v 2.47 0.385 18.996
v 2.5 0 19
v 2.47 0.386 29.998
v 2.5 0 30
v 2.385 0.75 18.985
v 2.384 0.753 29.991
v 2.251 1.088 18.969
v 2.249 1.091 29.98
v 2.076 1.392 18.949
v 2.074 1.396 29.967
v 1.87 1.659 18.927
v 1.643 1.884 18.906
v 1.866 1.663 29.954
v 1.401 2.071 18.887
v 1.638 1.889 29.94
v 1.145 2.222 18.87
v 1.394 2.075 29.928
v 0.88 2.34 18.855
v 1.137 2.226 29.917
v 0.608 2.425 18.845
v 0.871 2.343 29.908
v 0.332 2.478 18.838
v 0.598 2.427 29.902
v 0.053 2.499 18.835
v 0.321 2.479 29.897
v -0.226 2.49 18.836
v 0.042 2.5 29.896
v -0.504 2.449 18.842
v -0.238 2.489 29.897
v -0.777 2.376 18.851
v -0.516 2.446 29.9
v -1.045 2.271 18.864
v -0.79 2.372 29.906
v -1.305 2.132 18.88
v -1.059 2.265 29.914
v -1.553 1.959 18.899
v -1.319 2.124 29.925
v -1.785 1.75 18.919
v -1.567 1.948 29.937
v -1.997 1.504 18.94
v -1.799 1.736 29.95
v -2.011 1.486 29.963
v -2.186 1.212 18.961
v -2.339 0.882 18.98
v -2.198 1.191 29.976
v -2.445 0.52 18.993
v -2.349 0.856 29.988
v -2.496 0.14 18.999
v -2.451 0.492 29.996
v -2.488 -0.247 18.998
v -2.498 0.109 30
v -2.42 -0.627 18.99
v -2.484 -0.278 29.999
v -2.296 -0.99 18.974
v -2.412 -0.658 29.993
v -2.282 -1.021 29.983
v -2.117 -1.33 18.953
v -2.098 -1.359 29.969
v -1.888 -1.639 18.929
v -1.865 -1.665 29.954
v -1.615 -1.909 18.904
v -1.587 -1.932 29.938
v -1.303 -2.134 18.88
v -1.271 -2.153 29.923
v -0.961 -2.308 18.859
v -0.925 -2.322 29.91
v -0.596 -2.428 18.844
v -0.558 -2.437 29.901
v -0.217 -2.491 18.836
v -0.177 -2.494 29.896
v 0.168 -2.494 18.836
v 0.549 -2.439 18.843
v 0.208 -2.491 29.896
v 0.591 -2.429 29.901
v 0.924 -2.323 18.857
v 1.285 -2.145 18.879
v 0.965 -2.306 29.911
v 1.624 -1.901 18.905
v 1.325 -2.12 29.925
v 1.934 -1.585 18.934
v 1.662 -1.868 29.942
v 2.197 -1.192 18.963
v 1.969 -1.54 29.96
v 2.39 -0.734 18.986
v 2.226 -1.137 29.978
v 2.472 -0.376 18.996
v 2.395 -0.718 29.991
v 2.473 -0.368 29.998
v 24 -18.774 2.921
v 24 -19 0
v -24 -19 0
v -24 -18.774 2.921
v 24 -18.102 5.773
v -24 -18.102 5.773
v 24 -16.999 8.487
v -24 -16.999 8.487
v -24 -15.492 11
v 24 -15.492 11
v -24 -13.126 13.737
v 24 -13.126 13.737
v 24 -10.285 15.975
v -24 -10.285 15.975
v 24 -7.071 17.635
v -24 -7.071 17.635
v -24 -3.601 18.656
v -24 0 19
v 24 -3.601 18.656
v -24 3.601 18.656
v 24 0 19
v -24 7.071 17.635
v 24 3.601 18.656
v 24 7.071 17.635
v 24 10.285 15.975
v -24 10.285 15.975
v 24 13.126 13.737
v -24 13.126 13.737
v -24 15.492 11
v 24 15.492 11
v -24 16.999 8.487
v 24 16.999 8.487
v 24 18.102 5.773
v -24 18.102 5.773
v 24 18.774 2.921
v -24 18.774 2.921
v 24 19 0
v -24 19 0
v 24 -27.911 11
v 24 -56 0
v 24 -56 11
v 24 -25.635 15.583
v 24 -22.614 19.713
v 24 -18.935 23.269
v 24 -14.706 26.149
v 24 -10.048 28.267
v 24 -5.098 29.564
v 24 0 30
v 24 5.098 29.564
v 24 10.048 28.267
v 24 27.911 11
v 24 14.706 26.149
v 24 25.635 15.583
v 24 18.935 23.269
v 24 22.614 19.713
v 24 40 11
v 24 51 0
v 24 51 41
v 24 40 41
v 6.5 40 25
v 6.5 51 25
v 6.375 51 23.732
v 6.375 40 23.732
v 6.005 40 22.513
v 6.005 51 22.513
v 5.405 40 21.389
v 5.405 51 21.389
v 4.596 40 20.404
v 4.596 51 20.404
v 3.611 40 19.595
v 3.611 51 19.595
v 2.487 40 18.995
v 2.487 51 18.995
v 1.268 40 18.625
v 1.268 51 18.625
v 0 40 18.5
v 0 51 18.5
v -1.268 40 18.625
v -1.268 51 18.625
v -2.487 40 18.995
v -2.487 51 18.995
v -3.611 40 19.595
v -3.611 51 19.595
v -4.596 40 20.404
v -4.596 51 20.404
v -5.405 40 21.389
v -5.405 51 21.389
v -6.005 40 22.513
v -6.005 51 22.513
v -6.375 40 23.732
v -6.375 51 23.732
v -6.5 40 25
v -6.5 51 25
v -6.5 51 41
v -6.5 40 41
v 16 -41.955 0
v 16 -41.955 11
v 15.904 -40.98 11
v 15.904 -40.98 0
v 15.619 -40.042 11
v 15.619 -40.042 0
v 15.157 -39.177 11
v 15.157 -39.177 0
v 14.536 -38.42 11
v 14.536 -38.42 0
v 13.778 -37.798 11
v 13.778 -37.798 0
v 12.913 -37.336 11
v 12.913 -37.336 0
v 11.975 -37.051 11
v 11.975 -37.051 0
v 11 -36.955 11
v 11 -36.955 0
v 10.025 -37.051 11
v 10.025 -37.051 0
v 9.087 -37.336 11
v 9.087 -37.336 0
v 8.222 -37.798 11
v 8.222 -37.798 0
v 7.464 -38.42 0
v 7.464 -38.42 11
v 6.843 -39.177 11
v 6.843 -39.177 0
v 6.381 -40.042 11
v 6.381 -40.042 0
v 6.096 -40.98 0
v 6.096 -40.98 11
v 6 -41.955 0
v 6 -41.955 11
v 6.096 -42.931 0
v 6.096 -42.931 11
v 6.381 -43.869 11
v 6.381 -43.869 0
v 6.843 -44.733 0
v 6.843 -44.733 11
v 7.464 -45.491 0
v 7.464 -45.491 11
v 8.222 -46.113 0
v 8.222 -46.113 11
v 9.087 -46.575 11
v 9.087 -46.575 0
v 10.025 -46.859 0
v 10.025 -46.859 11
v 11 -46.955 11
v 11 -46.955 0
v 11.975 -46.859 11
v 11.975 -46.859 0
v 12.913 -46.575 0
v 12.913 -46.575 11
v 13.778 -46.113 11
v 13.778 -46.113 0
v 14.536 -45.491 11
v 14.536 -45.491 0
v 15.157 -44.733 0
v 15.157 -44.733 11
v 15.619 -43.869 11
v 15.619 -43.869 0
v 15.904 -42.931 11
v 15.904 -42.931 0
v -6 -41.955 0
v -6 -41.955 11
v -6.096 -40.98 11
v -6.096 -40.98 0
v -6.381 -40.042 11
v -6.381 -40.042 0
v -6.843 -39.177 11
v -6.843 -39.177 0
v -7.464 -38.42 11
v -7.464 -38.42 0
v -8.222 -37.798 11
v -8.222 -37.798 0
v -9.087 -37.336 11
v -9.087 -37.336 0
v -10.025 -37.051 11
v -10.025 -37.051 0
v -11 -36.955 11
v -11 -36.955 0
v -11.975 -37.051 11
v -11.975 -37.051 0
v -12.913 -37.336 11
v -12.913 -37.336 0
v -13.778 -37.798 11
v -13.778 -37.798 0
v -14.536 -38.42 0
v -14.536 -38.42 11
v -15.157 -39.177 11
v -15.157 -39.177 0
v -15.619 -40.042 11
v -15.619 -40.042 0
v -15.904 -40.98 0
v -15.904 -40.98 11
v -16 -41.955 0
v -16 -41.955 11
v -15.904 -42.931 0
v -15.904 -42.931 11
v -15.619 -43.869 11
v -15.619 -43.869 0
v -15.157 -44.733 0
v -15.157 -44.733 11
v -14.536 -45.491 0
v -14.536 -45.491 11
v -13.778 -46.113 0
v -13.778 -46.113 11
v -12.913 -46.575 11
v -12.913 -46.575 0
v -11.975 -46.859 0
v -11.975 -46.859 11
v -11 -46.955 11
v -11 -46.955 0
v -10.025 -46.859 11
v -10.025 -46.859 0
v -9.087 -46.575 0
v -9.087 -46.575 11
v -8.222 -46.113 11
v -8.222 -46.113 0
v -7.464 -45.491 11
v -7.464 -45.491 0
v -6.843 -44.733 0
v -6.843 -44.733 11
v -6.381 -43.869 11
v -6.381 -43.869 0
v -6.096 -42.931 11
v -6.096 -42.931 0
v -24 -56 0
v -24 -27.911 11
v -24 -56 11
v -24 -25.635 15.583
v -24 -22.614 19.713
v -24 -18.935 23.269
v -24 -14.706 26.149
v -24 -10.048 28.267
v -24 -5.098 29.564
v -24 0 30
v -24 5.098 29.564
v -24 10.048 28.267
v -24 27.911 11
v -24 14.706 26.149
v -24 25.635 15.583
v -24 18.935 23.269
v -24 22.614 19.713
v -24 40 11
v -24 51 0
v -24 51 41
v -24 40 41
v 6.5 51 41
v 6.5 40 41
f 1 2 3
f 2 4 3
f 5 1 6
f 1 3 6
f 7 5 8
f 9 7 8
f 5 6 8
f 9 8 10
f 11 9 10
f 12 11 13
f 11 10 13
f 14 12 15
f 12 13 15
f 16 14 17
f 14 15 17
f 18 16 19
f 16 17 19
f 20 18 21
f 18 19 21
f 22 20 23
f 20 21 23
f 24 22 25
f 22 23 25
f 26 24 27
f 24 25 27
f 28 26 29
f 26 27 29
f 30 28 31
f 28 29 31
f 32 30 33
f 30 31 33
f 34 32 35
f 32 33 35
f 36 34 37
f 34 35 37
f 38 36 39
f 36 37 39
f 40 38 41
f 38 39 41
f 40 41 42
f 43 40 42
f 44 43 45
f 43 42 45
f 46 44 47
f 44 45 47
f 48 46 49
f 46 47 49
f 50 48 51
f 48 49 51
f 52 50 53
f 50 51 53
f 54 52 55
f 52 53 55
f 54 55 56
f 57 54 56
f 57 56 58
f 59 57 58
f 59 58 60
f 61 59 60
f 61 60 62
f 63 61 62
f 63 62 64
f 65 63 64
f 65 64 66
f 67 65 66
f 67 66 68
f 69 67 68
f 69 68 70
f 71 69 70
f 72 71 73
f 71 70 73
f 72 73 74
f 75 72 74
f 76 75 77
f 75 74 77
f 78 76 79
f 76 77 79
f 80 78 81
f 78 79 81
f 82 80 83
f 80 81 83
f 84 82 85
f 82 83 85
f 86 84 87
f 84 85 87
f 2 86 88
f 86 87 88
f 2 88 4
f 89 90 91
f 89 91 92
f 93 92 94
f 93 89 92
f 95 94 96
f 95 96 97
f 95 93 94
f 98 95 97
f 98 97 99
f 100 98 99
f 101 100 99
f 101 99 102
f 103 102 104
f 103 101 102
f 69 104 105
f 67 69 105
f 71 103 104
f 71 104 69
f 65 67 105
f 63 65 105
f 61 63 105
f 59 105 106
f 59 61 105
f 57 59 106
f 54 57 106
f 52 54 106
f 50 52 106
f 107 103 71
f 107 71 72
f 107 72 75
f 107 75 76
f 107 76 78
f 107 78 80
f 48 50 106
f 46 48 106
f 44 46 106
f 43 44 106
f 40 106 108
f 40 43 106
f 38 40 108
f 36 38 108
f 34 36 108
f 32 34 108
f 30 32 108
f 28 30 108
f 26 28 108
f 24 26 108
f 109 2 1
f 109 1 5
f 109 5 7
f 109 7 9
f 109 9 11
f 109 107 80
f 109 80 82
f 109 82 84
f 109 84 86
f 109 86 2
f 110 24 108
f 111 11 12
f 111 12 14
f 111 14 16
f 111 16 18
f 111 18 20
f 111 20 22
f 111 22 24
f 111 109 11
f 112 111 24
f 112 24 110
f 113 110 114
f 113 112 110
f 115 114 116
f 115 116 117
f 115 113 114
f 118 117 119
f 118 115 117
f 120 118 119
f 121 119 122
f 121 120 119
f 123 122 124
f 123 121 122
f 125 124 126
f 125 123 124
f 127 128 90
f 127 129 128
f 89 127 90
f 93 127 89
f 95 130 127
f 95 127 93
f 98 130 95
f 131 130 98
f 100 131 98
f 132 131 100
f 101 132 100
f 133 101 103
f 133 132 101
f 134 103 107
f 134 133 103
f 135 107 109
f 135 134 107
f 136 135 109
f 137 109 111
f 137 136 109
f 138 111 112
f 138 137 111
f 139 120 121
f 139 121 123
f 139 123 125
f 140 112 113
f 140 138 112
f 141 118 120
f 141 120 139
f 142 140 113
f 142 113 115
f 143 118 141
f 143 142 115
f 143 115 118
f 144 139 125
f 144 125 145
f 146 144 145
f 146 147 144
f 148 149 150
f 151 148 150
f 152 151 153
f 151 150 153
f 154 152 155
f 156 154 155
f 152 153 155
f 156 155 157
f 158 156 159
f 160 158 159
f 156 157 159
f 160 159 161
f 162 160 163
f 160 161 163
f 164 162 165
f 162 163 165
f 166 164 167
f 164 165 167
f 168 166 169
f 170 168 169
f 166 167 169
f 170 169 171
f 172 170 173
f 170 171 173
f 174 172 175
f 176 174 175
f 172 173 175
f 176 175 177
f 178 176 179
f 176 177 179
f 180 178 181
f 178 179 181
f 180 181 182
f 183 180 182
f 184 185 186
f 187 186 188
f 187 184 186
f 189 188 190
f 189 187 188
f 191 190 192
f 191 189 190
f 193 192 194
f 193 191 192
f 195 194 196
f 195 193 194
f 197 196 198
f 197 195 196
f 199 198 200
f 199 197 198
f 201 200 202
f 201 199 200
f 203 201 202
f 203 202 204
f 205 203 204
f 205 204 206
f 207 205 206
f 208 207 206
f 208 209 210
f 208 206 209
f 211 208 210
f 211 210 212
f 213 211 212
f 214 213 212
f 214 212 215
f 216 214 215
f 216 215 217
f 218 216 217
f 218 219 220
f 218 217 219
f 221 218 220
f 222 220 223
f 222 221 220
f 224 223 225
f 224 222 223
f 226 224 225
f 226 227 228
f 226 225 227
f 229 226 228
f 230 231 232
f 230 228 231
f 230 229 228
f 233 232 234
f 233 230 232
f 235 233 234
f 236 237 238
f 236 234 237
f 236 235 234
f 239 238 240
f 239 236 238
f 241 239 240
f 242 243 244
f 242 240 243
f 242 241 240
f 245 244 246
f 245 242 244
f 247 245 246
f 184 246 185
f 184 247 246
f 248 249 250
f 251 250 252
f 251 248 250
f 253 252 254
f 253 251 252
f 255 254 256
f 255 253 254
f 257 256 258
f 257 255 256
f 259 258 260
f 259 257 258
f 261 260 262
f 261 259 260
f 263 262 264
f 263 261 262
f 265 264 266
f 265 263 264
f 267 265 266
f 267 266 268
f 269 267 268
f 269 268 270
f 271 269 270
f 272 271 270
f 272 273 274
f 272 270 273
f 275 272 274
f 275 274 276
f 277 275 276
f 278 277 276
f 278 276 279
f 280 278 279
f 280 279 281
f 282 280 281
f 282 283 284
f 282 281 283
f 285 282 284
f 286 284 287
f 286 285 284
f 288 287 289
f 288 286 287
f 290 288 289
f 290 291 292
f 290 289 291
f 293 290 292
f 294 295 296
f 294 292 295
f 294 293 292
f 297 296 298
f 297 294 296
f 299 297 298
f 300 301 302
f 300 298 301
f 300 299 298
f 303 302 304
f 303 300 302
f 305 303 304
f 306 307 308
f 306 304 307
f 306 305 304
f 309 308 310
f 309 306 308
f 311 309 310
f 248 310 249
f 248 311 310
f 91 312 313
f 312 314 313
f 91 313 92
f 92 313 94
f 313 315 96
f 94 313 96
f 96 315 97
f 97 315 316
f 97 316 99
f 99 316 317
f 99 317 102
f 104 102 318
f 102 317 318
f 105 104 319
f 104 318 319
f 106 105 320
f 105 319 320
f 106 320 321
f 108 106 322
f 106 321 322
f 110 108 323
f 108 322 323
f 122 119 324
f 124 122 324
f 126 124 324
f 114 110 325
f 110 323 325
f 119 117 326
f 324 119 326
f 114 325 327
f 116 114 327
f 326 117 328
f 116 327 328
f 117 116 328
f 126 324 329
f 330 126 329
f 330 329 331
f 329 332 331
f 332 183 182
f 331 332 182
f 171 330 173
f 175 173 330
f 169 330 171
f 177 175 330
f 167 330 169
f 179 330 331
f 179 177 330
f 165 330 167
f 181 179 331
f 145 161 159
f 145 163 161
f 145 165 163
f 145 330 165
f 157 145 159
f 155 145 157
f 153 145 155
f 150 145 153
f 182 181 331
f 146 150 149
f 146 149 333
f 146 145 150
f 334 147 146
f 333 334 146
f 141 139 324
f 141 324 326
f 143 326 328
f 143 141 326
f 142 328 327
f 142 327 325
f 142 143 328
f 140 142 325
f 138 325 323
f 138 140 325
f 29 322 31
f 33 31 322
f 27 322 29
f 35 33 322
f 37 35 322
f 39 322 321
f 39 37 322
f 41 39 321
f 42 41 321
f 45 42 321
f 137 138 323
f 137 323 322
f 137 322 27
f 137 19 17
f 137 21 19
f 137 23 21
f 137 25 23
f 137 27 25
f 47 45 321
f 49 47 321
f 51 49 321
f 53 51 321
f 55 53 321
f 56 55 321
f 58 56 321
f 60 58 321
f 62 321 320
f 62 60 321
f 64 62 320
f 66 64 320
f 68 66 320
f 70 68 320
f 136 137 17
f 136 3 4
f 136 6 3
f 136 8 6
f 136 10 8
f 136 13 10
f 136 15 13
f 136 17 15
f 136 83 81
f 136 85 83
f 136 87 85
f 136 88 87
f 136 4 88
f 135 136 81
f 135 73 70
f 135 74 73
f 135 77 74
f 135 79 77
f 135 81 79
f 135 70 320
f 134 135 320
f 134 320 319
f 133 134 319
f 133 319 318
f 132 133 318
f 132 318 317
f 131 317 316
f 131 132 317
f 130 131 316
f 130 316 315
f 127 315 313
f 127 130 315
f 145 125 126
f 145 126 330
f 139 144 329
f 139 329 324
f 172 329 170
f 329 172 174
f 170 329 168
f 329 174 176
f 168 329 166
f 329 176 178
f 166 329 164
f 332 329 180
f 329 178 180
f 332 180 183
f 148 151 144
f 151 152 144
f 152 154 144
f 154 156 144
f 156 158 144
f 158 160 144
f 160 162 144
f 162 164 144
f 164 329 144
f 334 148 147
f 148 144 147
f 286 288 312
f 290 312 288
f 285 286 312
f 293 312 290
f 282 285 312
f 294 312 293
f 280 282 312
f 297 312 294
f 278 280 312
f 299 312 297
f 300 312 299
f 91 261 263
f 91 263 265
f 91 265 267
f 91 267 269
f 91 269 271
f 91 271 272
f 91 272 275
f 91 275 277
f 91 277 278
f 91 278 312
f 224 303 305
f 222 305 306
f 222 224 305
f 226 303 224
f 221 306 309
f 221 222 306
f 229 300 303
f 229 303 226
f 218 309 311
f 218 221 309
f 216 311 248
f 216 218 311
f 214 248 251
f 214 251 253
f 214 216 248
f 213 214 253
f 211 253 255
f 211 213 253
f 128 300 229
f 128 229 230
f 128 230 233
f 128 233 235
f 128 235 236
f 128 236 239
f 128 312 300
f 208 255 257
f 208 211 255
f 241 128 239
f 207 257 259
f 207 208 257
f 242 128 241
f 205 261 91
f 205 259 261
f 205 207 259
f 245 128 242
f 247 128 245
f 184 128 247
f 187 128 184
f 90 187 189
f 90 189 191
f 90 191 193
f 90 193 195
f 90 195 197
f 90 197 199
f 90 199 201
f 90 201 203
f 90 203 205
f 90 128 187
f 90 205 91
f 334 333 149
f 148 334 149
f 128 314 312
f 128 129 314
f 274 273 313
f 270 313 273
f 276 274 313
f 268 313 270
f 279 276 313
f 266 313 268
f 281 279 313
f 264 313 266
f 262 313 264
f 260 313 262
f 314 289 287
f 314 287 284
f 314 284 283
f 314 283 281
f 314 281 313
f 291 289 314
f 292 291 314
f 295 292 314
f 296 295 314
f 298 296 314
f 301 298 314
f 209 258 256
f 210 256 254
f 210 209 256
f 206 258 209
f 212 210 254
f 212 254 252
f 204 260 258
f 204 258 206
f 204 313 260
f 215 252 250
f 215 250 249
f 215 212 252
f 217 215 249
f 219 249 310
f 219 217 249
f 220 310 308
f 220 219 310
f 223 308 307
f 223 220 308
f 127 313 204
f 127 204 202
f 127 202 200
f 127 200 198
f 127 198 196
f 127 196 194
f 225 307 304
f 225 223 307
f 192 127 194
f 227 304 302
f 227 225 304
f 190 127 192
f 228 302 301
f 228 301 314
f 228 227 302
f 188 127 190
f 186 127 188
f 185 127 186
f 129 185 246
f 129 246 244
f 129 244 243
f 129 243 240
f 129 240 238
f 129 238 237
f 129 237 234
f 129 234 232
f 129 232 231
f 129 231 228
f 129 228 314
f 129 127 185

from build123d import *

# Parameters (mm, degrees)
F0_W     = 11
F0_H     = 30
F1_DEPTH = 24
F3_DEPTH = 17.9
F4_R     = 5
F4_R_2   = 2.5
F5_DEPTH = 51.2


with BuildPart() as f1:
    # F0 (on Right) → F1 (new body, symmetric)
    with BuildSketch(Plane.YZ):
        with BuildLine():
            Line((-56, 0), (-30, 0))
            ThreePointArc((-30, 0), (-29.4730143031, 5.5983415304), (-27.9105714739, 11))
            Line((-27.9105714739, 11), (-56, 11))
            Line((-56, 11), (-56, 0))
        make_face()
        with BuildLine():
            ThreePointArc((-27.9105714739, 11), (-29.4730143031, 5.5983415304), (-30, 0))
            Line((-30, 0), (-19, 0))
            ThreePointArc((-19, 0), (-18.1017503893, 5.7729223833), (-15.4919333848, 11))
            Line((-15.4919333848, 11), (-27.9105714739, 11))
        make_face()
        with BuildLine():
            Line((15.4919333848, 11), (27.9105714739, 11))
            ThreePointArc((27.9105714739, 11), (0, 30), (-27.9105714739, 11))
            Line((-27.9105714739, 11), (-15.4919333848, 11))
            ThreePointArc((-15.4919333848, 11), (0, 19), (15.4919333848, 11))
        make_face()
        with BuildLine():
            Line((19, 0), (30, 0))
            ThreePointArc((30, 0), (29.4730143031, 5.5983415304), (27.9105714739, 11))
            Line((27.9105714739, 11), (15.4919333848, 11))
            ThreePointArc((15.4919333848, 11), (18.1017503893, 5.7729223833), (19, 0))
        make_face()
        with BuildLine():
            ThreePointArc((27.9105714739, 11), (29.4730143031, 5.5983415304), (30, 0))
            Line((30, 0), (51, 0))
            Line((51, 0), (51, 11))
            Line((51, 11), (40, 11))
            Line((40, 11), (27.9105714739, 11))
        make_face()
        with Locations((45.5, 26)):
            Rectangle(F0_W, F0_H)
    extrude(amount=F1_DEPTH, both=True)

    # F2 (on face) → F3 (cut, symmetric)
    with BuildSketch(Plane(origin=(0, 51, 0), x_dir=(-1, 0, 0), z_dir=(0, 1, 0))):
        with BuildLine():
            ThreePointArc((-6.5, 25), (0, 18.5), (6.5, 25))
            ThreePointArc((6.5, 25), (0, 31.5), (-6.5, 25))
        make_face()
        with BuildLine():
            ThreePointArc((-6.5, 25), (0, 31.5), (6.5, 25))
            Line((6.5, 25), (6.5, 41))
            Line((6.5, 41), (-6.5, 41))
            Line((-6.5, 41), (-6.5, 25))
        make_face()
    extrude(amount=F3_DEPTH, both=True, mode=Mode.SUBTRACT)

    # F4 (on Top) → F5 (cut, symmetric)
    with BuildSketch(Plane.XY):
        with Locations((-11, -41.955285737)):
            Circle(F4_R)
        with Locations((11, -41.955285737)):
            Circle(F4_R)
        Circle(F4_R_2)
    extrude(amount=F5_DEPTH, both=True, mode=Mode.SUBTRACT)


solid = f1.part
